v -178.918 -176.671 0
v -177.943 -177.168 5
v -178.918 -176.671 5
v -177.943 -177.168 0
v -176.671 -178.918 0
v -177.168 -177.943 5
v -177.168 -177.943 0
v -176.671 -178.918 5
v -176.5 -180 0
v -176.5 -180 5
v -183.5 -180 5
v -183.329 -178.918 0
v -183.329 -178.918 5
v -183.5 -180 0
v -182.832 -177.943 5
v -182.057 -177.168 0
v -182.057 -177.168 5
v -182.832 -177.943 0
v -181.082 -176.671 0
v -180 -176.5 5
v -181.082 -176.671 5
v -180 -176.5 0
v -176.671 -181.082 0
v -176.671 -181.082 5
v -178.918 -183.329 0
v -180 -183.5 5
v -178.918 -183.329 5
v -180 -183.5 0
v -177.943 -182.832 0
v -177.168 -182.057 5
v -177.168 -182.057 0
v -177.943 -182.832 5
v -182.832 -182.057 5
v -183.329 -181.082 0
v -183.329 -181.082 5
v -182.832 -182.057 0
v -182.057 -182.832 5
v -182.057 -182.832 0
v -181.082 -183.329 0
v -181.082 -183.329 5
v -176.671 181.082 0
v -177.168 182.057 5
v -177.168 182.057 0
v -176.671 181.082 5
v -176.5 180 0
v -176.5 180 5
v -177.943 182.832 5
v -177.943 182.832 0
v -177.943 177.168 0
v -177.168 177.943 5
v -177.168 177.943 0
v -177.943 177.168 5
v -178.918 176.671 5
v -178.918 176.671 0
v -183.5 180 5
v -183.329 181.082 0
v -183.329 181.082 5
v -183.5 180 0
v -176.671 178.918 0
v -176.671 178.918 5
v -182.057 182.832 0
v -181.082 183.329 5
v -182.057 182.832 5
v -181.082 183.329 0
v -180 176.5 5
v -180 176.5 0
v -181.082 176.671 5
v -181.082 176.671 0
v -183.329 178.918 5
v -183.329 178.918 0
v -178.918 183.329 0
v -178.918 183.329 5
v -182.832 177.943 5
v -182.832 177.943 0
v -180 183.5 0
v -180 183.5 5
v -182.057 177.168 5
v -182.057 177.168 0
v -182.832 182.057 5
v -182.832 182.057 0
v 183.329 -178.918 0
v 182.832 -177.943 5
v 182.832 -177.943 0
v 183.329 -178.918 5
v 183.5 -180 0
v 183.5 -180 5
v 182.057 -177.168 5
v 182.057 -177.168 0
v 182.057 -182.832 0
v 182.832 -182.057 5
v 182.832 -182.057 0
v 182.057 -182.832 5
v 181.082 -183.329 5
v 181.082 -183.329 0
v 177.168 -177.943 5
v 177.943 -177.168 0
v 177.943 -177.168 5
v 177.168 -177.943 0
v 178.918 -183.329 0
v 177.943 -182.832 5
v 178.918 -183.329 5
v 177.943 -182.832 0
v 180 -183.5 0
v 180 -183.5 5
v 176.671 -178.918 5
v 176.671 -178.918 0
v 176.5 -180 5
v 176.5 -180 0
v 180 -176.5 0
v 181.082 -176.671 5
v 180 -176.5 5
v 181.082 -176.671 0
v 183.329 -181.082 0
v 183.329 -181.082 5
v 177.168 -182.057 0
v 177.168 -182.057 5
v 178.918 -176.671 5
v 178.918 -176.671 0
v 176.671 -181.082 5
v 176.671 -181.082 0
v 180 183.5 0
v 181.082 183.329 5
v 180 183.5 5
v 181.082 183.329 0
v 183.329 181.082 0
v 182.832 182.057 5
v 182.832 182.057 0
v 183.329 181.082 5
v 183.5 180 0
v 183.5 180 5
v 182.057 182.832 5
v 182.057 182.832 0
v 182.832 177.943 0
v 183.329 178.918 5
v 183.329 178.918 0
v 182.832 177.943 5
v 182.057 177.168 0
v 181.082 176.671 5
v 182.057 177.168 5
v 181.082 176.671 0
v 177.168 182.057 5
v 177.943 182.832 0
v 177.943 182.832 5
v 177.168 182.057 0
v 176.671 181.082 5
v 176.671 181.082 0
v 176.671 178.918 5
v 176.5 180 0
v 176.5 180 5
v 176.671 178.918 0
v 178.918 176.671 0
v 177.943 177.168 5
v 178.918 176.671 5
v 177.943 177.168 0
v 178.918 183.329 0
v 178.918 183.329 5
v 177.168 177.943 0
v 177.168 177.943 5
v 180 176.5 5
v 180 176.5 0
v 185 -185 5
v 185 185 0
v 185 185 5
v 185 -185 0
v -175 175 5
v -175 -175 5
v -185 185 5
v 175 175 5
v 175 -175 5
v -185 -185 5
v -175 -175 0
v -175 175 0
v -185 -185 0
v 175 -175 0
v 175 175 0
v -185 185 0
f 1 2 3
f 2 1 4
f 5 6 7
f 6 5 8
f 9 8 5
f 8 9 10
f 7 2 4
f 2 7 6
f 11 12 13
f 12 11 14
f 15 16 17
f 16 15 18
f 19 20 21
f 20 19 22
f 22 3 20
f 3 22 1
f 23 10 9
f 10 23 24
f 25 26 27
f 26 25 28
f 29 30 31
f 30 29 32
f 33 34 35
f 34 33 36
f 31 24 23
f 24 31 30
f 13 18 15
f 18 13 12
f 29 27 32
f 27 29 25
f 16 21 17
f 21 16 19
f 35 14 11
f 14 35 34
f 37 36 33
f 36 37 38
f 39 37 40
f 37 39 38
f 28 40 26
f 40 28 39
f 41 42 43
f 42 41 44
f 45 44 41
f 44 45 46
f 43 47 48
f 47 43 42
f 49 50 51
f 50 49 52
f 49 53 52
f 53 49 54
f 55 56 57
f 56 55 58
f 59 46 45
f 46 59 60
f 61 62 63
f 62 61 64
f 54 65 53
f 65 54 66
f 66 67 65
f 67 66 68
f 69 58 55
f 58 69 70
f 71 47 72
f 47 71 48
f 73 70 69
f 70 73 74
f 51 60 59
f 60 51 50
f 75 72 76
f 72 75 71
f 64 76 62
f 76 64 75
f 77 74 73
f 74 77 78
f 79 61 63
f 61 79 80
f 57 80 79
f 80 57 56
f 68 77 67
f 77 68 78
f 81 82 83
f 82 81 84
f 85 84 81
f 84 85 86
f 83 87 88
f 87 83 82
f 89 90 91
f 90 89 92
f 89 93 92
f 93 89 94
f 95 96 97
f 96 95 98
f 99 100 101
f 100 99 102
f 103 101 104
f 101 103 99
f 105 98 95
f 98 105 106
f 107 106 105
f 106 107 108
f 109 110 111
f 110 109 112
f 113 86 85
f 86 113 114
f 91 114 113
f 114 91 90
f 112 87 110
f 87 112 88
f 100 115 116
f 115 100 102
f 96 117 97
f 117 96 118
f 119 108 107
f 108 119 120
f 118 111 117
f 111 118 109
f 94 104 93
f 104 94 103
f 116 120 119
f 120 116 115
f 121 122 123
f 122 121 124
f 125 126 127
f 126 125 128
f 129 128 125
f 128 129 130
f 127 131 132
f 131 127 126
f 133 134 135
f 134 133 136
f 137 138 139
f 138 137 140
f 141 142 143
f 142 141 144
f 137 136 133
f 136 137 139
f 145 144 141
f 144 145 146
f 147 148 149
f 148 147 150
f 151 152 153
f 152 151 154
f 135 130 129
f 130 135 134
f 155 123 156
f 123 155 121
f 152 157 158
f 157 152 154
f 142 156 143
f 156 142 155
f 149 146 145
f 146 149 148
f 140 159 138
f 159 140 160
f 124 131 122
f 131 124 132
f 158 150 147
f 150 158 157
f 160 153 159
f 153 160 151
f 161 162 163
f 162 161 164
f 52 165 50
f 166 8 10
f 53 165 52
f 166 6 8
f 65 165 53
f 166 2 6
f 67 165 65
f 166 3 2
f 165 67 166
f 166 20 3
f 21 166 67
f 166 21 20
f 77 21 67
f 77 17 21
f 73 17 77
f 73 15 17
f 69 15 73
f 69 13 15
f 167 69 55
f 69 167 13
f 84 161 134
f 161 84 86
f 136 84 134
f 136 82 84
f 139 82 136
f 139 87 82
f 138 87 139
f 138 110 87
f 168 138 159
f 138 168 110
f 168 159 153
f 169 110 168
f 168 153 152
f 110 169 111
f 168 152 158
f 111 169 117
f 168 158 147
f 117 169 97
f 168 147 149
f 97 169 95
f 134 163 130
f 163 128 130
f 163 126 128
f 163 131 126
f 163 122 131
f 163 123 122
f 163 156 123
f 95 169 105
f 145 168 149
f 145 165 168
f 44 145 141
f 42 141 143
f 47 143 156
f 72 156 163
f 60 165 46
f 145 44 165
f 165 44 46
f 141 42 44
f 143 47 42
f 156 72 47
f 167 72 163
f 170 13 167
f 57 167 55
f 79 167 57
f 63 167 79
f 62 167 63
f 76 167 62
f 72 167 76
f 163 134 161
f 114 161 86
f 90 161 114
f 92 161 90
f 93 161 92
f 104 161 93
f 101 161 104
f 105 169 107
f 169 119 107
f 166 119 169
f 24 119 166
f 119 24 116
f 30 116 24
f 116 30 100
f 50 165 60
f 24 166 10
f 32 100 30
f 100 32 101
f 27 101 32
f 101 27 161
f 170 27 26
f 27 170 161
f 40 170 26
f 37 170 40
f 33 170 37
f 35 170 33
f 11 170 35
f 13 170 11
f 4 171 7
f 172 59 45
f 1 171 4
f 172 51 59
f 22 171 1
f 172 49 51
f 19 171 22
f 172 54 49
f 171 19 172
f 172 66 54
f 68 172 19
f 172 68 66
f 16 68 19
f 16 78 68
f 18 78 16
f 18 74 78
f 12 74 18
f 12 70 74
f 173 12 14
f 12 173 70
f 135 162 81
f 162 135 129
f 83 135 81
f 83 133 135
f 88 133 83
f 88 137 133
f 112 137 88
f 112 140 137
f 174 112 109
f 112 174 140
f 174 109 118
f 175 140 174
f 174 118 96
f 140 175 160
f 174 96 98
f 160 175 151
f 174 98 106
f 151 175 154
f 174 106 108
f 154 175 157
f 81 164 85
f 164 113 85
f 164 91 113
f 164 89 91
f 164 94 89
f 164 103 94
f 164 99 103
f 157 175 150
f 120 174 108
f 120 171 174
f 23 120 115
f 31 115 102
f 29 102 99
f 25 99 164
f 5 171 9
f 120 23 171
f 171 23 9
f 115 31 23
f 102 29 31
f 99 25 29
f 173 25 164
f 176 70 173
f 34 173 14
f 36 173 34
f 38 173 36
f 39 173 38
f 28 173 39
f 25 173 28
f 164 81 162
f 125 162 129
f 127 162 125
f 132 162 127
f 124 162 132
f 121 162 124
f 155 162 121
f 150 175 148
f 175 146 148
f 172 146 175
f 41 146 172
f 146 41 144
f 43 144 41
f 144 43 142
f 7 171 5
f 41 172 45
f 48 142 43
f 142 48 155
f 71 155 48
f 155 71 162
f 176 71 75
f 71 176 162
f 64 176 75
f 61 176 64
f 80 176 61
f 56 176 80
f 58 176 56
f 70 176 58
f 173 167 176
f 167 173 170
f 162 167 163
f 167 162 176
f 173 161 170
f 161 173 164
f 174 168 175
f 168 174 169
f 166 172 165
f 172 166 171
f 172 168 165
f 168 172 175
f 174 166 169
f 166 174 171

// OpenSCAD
module pyramid_pin() {
    rotate([0,0,45]) cylinder(h=3, d1=5.4, d2=0, $fn=4);
}

module shim_body() {
    difference() {
        translate([0,0,2.5]) cube([370, 370, 5], center=true);
        translate([0,0,2.5]) cube([350, 350, 6], center=true);
        // Corner holes
        for (x = [-180, 180]) {
            for (y = [-180, 180]) {
                translate([x, y, -1]) cylinder(h=10, d=7, $fn=20);
            }
        }
    }
}

shim_body();
